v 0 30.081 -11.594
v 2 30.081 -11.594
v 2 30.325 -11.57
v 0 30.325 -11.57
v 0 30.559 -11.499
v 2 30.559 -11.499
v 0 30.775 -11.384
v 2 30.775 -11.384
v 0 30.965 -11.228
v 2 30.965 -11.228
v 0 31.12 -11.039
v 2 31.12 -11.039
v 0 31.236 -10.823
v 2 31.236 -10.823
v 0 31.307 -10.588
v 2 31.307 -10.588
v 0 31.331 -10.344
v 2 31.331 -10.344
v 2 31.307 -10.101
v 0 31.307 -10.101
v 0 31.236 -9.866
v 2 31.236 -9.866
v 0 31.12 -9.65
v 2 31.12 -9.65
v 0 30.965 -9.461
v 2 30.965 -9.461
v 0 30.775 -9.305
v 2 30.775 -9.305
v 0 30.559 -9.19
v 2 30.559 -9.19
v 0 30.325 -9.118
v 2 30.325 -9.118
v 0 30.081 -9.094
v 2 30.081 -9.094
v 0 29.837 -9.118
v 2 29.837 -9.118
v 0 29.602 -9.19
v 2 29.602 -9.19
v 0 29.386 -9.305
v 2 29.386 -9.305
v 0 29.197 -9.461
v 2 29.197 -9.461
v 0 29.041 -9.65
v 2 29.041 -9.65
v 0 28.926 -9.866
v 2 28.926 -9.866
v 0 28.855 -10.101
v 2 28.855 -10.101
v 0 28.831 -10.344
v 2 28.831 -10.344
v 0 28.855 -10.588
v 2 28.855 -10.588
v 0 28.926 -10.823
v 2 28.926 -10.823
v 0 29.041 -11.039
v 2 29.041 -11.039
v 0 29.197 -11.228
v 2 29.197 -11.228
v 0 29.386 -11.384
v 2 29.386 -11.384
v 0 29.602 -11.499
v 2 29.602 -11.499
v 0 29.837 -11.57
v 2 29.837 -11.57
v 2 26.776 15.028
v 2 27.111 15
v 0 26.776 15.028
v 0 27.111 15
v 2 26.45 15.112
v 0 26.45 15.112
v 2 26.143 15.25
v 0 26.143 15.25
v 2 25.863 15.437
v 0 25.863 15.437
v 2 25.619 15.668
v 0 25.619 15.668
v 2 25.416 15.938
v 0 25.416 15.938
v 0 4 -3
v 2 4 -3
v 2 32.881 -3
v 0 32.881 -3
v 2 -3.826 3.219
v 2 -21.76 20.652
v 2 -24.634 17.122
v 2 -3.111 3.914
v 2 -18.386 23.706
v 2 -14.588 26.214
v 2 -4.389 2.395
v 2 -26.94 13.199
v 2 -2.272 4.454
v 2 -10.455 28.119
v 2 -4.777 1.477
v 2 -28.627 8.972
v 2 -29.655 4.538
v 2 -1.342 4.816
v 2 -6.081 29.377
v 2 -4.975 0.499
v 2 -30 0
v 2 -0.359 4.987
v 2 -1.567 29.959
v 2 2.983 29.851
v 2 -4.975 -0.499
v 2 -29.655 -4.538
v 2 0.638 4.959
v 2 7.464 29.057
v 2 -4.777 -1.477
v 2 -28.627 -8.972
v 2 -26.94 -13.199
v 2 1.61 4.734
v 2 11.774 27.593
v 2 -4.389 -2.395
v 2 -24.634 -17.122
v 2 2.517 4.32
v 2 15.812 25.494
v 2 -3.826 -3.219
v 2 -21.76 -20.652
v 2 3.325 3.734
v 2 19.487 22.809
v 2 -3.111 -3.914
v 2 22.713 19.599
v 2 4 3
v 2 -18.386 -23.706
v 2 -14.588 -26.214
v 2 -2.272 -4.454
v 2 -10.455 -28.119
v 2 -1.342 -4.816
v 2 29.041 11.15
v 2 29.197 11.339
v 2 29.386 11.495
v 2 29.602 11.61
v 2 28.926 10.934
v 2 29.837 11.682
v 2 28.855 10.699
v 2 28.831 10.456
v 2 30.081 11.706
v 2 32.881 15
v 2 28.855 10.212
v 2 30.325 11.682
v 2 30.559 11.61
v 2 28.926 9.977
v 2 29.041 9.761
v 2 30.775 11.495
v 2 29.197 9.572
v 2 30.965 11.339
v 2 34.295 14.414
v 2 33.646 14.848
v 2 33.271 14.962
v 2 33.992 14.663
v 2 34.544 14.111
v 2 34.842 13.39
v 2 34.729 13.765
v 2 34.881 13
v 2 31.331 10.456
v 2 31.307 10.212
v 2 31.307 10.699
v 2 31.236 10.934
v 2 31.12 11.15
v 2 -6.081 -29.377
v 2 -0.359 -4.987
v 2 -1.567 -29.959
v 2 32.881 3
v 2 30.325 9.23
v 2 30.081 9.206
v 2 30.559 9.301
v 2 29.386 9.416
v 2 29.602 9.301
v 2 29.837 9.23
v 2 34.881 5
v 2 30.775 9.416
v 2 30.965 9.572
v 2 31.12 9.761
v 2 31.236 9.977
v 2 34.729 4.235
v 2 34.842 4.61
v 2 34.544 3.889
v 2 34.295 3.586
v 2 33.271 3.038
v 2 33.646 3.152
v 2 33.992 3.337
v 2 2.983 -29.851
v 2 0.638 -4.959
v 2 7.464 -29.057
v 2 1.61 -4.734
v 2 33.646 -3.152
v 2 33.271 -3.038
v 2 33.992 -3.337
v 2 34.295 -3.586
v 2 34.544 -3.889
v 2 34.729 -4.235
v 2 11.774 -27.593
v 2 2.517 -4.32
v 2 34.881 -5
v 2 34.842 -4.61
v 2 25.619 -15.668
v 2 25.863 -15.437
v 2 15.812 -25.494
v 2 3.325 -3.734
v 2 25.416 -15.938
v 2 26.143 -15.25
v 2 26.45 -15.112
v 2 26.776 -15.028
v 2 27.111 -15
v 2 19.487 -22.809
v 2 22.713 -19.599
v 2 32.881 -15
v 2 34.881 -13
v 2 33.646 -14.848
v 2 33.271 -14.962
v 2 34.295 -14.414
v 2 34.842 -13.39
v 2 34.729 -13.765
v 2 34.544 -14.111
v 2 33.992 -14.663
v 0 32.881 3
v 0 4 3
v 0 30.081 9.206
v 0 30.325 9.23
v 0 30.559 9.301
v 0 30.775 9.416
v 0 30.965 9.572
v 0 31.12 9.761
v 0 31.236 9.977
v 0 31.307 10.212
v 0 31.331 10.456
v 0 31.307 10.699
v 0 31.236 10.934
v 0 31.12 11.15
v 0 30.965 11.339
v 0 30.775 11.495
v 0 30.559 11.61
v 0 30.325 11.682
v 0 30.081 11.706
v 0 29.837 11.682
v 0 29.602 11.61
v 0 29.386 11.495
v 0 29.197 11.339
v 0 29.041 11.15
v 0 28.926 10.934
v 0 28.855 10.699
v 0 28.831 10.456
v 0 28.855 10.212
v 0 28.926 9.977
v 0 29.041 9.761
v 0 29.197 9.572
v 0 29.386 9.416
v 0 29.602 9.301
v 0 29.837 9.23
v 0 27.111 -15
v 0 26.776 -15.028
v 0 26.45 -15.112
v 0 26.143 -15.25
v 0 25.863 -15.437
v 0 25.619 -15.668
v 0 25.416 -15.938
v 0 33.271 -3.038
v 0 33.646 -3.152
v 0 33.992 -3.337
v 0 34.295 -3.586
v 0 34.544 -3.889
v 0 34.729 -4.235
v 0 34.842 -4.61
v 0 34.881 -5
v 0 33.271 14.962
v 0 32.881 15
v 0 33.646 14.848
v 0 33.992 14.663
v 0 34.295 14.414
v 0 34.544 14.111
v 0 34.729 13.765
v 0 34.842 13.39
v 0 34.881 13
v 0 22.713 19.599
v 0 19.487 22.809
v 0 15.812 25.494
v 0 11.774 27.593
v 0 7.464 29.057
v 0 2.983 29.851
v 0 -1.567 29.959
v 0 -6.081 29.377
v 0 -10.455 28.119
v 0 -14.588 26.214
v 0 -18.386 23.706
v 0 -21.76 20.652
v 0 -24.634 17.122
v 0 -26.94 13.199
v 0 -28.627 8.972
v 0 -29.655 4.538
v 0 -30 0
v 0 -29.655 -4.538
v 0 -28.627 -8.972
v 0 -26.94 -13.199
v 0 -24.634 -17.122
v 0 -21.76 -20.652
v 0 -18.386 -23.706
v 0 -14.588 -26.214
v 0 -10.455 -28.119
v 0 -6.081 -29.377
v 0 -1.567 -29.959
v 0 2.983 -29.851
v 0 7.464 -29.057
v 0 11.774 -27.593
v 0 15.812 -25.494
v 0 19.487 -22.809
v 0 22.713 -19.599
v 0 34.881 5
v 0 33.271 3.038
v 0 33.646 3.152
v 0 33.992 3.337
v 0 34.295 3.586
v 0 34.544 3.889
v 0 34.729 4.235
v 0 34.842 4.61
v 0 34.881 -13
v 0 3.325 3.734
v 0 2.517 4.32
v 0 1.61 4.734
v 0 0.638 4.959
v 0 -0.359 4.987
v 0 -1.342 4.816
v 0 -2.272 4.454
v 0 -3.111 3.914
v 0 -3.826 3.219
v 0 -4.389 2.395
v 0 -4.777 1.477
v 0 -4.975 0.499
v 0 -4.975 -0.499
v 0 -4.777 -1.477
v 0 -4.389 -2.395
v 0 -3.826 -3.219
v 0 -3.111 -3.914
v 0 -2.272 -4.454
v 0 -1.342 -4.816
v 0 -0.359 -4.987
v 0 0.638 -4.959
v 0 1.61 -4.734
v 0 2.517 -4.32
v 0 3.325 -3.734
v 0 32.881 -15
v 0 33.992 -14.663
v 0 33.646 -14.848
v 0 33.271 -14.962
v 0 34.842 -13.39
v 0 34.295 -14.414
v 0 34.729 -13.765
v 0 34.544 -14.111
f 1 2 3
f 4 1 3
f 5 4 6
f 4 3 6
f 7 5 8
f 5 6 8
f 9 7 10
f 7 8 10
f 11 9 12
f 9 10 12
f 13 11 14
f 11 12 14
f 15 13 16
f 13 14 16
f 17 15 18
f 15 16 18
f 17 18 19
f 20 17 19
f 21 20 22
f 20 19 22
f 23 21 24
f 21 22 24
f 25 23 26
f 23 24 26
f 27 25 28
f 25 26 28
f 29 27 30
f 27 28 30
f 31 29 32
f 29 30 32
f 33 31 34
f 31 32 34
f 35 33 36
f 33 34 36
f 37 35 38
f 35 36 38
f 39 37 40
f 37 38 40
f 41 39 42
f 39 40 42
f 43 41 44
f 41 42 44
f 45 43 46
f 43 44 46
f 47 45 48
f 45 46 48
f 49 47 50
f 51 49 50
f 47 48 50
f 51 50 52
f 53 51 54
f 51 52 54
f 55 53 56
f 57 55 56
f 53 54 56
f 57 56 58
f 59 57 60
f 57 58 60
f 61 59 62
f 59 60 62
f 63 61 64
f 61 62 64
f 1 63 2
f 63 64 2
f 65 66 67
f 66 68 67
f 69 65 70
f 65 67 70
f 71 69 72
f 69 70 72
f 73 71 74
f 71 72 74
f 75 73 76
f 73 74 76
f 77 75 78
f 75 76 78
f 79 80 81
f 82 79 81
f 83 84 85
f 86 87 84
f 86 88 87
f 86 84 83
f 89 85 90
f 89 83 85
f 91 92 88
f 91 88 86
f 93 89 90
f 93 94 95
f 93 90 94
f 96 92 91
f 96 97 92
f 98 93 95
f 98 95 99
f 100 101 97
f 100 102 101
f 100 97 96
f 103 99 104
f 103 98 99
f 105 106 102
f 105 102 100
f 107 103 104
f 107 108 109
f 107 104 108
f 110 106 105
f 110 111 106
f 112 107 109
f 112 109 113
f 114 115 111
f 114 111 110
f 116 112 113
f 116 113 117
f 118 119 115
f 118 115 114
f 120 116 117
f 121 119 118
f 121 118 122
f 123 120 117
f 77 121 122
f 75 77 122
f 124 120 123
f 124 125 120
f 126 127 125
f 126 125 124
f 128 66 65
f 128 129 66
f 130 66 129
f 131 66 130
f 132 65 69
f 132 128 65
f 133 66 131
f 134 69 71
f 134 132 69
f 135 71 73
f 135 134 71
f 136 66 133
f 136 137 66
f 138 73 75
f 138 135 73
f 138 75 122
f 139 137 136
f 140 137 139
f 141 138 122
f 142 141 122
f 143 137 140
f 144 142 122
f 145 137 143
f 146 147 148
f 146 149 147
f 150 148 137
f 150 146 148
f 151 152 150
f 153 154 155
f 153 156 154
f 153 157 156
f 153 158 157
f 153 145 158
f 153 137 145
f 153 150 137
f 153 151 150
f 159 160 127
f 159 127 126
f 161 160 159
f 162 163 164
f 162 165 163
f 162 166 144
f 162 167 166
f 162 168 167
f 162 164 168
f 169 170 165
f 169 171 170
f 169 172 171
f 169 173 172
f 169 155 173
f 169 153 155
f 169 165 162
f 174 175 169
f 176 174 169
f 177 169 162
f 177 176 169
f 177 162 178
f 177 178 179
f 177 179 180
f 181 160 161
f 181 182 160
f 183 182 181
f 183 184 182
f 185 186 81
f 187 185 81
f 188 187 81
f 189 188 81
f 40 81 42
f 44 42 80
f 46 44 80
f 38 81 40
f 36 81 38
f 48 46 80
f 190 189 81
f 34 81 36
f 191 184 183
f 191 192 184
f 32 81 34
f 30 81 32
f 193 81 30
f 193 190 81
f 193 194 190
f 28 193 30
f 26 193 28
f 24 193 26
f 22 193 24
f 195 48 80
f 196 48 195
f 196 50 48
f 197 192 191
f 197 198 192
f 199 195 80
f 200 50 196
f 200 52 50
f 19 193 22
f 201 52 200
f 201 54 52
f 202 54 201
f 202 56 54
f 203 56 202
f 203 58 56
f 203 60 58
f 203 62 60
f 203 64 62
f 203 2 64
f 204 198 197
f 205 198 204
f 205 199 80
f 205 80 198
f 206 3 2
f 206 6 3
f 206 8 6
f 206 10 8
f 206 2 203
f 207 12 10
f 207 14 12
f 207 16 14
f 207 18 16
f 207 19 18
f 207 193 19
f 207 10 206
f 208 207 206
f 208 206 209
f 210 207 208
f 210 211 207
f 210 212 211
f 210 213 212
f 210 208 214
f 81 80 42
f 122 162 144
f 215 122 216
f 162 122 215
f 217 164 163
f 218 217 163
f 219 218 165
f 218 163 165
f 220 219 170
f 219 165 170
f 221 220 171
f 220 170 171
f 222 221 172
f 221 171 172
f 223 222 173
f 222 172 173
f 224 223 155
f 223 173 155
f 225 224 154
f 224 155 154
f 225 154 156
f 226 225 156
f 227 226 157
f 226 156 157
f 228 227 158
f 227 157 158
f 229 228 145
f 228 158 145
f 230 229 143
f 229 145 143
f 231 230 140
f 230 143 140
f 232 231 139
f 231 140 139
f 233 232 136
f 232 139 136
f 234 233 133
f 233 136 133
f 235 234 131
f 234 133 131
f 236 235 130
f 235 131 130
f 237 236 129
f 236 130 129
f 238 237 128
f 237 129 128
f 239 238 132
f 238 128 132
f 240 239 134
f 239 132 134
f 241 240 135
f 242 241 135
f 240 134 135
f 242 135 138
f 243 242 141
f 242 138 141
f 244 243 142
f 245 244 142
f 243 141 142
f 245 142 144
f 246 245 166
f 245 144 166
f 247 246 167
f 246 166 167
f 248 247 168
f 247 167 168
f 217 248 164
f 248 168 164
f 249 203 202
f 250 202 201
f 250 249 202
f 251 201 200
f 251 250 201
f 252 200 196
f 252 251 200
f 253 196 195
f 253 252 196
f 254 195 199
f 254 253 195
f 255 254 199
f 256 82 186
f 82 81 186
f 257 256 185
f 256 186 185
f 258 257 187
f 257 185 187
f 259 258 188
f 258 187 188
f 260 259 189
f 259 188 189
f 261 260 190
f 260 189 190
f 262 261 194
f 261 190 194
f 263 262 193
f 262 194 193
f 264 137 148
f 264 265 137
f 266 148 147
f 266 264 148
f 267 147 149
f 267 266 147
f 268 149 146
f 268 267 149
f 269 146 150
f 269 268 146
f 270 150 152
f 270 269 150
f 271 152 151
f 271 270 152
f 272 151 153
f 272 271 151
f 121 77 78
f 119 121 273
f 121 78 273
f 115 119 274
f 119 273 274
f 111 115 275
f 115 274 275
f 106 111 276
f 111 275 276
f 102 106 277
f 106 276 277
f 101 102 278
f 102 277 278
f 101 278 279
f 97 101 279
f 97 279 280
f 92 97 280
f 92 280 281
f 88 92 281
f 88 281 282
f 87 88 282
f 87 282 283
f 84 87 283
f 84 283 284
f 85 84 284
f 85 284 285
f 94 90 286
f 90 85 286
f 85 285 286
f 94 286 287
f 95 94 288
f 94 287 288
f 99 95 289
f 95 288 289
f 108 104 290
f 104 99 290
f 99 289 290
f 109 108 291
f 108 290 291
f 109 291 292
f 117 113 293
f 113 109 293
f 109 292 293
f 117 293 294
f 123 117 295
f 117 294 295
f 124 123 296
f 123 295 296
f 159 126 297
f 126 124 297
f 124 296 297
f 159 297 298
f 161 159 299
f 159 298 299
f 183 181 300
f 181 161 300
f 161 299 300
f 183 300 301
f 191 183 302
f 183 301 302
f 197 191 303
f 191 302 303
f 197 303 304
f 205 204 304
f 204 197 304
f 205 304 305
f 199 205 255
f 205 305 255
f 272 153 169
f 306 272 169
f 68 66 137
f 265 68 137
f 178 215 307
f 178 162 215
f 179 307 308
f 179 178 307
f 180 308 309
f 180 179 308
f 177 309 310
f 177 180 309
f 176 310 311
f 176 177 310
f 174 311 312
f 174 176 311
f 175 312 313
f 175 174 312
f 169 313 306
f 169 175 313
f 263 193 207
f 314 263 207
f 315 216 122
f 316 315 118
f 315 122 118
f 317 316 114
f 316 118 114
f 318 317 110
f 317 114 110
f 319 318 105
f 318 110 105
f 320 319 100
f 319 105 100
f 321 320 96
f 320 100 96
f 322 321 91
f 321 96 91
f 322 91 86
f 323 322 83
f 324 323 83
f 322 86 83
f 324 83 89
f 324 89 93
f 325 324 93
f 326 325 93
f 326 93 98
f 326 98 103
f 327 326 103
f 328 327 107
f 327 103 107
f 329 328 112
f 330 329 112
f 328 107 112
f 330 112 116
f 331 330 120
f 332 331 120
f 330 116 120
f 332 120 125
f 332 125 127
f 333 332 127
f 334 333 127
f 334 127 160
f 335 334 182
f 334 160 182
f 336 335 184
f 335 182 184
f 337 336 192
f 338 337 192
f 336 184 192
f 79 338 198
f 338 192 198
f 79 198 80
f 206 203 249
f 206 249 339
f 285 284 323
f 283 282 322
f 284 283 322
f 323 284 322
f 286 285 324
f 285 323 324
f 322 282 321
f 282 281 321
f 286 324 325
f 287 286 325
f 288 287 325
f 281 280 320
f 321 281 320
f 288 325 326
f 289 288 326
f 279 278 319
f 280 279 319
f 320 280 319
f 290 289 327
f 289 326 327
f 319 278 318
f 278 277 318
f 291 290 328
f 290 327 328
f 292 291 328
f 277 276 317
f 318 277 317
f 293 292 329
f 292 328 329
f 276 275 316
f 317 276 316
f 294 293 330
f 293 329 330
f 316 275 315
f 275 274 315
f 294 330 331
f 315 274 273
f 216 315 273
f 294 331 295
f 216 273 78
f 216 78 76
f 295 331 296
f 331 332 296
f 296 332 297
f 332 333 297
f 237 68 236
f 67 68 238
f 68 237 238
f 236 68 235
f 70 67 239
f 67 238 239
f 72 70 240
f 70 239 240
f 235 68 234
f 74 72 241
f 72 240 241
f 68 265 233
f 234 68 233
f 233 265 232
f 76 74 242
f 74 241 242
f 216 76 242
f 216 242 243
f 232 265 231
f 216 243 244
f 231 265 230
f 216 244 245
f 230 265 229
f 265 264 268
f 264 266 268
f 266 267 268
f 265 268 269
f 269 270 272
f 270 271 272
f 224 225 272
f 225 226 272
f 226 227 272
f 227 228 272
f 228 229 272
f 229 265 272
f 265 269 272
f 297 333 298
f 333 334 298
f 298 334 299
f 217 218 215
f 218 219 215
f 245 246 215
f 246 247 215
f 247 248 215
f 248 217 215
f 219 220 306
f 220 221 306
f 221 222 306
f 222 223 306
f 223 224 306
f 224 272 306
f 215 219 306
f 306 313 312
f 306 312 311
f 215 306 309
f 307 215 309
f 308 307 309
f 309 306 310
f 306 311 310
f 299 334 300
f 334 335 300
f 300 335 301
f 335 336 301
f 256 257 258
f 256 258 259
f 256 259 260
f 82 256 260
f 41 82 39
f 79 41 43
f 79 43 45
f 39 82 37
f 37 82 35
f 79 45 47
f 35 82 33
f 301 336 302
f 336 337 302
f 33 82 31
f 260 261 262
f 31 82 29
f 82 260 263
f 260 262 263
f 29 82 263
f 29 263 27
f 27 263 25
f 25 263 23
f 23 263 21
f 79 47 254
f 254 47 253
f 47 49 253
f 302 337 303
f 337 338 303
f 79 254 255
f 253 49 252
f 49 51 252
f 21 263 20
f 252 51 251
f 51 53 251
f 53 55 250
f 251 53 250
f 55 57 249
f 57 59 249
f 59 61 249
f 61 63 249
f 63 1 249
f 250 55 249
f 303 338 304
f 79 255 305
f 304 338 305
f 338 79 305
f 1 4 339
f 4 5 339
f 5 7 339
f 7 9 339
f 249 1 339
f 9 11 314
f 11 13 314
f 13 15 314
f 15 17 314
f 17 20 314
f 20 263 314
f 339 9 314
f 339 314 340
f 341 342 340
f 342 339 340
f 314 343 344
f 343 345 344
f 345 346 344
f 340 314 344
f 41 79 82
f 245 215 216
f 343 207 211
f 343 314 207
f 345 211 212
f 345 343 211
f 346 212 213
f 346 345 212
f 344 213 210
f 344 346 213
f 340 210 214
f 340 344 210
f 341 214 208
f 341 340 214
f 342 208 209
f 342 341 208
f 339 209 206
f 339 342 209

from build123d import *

# Parameters (mm, degrees)
SKETCH_1_R          = 30
EXTRUDE_1_DEPTH     = 2
SKETCH_2_R          = 5
CUT_EXTRUDE_1_DEPTH = 2
SKETCH_5_W          = 30
SKETCH_5_H          = 8.9
EXTRUDE_2_DEPTH     = 2
SKETCH_4_W          = 6
SKETCH_4_H          = 36.621783582
CUT_EXTRUDE_3_DEPTH = 2
FILLET_1_R          = 2
SKETCH_6_R          = 1.25
CUT_EXTRUDE_4_DEPTH = 2


with BuildPart() as part:
    # 草图1 → 凸台-拉伸1 (new body)
    with BuildSketch(Plane(origin=(0, 0, 0), x_dir=(0, 0, -1), z_dir=(1, 0, 0))):
        Circle(SKETCH_1_R)
    extrude(amount=EXTRUDE_1_DEPTH)

    # 草图2 → 切除-拉伸1 (cut)
    with BuildSketch(Plane(origin=(2, 0, 0), x_dir=(0, 0, -1), z_dir=(1, 0, 0))):
        Circle(SKETCH_2_R)
    extrude(amount=-CUT_EXTRUDE_1_DEPTH, mode=Mode.SUBTRACT)

    # 草图5 → 凸台-拉伸2 (add)
    with BuildSketch(Plane(origin=(2, 0, 0), x_dir=(0, 0, -1), z_dir=(1, 0, 0))):
        with Locations((0, 30.430762114)):
            Rectangle(SKETCH_5_W, SKETCH_5_H)
    extrude(amount=-EXTRUDE_2_DEPTH)

    # 草图4 → 切除-拉伸3 (cut)
    with BuildSketch(Plane(origin=(2, 0, 0), x_dir=(0, 0, -1), z_dir=(1, 0, 0))):
        with Locations((0, 20.061807767)):
            Rectangle(SKETCH_4_W, SKETCH_4_H)
    extrude(amount=-CUT_EXTRUDE_3_DEPTH, mode=Mode.SUBTRACT)

    # 圆角1
    fillet_1_edges = [part.edges().sort_by_distance(p)[0] for p in [
        (1, 25.980762114, 15),
        (1, 34.880762114, 15),
        (1, 34.880762114, -15),
        (1, 25.980762114, -15),
        (1, 34.880762114, -3),
        (1, 34.880762114, 3),
    ]]
    fillet(fillet_1_edges, radius=FILLET_1_R)

    # 草图6 → 切除-拉伸4 (cut)
    with BuildSketch(Plane(origin=(2, 0, 0), x_dir=(0, 0, -1), z_dir=(1, 0, 0))):
        with Locations((-10.455602866, 30.080762114)):
            Circle(SKETCH_6_R)
        with Locations((10.344397134, 30.080762114)):
            Circle(SKETCH_6_R)
    extrude(amount=-CUT_EXTRUDE_4_DEPTH, mode=Mode.SUBTRACT)


solid = part.part
